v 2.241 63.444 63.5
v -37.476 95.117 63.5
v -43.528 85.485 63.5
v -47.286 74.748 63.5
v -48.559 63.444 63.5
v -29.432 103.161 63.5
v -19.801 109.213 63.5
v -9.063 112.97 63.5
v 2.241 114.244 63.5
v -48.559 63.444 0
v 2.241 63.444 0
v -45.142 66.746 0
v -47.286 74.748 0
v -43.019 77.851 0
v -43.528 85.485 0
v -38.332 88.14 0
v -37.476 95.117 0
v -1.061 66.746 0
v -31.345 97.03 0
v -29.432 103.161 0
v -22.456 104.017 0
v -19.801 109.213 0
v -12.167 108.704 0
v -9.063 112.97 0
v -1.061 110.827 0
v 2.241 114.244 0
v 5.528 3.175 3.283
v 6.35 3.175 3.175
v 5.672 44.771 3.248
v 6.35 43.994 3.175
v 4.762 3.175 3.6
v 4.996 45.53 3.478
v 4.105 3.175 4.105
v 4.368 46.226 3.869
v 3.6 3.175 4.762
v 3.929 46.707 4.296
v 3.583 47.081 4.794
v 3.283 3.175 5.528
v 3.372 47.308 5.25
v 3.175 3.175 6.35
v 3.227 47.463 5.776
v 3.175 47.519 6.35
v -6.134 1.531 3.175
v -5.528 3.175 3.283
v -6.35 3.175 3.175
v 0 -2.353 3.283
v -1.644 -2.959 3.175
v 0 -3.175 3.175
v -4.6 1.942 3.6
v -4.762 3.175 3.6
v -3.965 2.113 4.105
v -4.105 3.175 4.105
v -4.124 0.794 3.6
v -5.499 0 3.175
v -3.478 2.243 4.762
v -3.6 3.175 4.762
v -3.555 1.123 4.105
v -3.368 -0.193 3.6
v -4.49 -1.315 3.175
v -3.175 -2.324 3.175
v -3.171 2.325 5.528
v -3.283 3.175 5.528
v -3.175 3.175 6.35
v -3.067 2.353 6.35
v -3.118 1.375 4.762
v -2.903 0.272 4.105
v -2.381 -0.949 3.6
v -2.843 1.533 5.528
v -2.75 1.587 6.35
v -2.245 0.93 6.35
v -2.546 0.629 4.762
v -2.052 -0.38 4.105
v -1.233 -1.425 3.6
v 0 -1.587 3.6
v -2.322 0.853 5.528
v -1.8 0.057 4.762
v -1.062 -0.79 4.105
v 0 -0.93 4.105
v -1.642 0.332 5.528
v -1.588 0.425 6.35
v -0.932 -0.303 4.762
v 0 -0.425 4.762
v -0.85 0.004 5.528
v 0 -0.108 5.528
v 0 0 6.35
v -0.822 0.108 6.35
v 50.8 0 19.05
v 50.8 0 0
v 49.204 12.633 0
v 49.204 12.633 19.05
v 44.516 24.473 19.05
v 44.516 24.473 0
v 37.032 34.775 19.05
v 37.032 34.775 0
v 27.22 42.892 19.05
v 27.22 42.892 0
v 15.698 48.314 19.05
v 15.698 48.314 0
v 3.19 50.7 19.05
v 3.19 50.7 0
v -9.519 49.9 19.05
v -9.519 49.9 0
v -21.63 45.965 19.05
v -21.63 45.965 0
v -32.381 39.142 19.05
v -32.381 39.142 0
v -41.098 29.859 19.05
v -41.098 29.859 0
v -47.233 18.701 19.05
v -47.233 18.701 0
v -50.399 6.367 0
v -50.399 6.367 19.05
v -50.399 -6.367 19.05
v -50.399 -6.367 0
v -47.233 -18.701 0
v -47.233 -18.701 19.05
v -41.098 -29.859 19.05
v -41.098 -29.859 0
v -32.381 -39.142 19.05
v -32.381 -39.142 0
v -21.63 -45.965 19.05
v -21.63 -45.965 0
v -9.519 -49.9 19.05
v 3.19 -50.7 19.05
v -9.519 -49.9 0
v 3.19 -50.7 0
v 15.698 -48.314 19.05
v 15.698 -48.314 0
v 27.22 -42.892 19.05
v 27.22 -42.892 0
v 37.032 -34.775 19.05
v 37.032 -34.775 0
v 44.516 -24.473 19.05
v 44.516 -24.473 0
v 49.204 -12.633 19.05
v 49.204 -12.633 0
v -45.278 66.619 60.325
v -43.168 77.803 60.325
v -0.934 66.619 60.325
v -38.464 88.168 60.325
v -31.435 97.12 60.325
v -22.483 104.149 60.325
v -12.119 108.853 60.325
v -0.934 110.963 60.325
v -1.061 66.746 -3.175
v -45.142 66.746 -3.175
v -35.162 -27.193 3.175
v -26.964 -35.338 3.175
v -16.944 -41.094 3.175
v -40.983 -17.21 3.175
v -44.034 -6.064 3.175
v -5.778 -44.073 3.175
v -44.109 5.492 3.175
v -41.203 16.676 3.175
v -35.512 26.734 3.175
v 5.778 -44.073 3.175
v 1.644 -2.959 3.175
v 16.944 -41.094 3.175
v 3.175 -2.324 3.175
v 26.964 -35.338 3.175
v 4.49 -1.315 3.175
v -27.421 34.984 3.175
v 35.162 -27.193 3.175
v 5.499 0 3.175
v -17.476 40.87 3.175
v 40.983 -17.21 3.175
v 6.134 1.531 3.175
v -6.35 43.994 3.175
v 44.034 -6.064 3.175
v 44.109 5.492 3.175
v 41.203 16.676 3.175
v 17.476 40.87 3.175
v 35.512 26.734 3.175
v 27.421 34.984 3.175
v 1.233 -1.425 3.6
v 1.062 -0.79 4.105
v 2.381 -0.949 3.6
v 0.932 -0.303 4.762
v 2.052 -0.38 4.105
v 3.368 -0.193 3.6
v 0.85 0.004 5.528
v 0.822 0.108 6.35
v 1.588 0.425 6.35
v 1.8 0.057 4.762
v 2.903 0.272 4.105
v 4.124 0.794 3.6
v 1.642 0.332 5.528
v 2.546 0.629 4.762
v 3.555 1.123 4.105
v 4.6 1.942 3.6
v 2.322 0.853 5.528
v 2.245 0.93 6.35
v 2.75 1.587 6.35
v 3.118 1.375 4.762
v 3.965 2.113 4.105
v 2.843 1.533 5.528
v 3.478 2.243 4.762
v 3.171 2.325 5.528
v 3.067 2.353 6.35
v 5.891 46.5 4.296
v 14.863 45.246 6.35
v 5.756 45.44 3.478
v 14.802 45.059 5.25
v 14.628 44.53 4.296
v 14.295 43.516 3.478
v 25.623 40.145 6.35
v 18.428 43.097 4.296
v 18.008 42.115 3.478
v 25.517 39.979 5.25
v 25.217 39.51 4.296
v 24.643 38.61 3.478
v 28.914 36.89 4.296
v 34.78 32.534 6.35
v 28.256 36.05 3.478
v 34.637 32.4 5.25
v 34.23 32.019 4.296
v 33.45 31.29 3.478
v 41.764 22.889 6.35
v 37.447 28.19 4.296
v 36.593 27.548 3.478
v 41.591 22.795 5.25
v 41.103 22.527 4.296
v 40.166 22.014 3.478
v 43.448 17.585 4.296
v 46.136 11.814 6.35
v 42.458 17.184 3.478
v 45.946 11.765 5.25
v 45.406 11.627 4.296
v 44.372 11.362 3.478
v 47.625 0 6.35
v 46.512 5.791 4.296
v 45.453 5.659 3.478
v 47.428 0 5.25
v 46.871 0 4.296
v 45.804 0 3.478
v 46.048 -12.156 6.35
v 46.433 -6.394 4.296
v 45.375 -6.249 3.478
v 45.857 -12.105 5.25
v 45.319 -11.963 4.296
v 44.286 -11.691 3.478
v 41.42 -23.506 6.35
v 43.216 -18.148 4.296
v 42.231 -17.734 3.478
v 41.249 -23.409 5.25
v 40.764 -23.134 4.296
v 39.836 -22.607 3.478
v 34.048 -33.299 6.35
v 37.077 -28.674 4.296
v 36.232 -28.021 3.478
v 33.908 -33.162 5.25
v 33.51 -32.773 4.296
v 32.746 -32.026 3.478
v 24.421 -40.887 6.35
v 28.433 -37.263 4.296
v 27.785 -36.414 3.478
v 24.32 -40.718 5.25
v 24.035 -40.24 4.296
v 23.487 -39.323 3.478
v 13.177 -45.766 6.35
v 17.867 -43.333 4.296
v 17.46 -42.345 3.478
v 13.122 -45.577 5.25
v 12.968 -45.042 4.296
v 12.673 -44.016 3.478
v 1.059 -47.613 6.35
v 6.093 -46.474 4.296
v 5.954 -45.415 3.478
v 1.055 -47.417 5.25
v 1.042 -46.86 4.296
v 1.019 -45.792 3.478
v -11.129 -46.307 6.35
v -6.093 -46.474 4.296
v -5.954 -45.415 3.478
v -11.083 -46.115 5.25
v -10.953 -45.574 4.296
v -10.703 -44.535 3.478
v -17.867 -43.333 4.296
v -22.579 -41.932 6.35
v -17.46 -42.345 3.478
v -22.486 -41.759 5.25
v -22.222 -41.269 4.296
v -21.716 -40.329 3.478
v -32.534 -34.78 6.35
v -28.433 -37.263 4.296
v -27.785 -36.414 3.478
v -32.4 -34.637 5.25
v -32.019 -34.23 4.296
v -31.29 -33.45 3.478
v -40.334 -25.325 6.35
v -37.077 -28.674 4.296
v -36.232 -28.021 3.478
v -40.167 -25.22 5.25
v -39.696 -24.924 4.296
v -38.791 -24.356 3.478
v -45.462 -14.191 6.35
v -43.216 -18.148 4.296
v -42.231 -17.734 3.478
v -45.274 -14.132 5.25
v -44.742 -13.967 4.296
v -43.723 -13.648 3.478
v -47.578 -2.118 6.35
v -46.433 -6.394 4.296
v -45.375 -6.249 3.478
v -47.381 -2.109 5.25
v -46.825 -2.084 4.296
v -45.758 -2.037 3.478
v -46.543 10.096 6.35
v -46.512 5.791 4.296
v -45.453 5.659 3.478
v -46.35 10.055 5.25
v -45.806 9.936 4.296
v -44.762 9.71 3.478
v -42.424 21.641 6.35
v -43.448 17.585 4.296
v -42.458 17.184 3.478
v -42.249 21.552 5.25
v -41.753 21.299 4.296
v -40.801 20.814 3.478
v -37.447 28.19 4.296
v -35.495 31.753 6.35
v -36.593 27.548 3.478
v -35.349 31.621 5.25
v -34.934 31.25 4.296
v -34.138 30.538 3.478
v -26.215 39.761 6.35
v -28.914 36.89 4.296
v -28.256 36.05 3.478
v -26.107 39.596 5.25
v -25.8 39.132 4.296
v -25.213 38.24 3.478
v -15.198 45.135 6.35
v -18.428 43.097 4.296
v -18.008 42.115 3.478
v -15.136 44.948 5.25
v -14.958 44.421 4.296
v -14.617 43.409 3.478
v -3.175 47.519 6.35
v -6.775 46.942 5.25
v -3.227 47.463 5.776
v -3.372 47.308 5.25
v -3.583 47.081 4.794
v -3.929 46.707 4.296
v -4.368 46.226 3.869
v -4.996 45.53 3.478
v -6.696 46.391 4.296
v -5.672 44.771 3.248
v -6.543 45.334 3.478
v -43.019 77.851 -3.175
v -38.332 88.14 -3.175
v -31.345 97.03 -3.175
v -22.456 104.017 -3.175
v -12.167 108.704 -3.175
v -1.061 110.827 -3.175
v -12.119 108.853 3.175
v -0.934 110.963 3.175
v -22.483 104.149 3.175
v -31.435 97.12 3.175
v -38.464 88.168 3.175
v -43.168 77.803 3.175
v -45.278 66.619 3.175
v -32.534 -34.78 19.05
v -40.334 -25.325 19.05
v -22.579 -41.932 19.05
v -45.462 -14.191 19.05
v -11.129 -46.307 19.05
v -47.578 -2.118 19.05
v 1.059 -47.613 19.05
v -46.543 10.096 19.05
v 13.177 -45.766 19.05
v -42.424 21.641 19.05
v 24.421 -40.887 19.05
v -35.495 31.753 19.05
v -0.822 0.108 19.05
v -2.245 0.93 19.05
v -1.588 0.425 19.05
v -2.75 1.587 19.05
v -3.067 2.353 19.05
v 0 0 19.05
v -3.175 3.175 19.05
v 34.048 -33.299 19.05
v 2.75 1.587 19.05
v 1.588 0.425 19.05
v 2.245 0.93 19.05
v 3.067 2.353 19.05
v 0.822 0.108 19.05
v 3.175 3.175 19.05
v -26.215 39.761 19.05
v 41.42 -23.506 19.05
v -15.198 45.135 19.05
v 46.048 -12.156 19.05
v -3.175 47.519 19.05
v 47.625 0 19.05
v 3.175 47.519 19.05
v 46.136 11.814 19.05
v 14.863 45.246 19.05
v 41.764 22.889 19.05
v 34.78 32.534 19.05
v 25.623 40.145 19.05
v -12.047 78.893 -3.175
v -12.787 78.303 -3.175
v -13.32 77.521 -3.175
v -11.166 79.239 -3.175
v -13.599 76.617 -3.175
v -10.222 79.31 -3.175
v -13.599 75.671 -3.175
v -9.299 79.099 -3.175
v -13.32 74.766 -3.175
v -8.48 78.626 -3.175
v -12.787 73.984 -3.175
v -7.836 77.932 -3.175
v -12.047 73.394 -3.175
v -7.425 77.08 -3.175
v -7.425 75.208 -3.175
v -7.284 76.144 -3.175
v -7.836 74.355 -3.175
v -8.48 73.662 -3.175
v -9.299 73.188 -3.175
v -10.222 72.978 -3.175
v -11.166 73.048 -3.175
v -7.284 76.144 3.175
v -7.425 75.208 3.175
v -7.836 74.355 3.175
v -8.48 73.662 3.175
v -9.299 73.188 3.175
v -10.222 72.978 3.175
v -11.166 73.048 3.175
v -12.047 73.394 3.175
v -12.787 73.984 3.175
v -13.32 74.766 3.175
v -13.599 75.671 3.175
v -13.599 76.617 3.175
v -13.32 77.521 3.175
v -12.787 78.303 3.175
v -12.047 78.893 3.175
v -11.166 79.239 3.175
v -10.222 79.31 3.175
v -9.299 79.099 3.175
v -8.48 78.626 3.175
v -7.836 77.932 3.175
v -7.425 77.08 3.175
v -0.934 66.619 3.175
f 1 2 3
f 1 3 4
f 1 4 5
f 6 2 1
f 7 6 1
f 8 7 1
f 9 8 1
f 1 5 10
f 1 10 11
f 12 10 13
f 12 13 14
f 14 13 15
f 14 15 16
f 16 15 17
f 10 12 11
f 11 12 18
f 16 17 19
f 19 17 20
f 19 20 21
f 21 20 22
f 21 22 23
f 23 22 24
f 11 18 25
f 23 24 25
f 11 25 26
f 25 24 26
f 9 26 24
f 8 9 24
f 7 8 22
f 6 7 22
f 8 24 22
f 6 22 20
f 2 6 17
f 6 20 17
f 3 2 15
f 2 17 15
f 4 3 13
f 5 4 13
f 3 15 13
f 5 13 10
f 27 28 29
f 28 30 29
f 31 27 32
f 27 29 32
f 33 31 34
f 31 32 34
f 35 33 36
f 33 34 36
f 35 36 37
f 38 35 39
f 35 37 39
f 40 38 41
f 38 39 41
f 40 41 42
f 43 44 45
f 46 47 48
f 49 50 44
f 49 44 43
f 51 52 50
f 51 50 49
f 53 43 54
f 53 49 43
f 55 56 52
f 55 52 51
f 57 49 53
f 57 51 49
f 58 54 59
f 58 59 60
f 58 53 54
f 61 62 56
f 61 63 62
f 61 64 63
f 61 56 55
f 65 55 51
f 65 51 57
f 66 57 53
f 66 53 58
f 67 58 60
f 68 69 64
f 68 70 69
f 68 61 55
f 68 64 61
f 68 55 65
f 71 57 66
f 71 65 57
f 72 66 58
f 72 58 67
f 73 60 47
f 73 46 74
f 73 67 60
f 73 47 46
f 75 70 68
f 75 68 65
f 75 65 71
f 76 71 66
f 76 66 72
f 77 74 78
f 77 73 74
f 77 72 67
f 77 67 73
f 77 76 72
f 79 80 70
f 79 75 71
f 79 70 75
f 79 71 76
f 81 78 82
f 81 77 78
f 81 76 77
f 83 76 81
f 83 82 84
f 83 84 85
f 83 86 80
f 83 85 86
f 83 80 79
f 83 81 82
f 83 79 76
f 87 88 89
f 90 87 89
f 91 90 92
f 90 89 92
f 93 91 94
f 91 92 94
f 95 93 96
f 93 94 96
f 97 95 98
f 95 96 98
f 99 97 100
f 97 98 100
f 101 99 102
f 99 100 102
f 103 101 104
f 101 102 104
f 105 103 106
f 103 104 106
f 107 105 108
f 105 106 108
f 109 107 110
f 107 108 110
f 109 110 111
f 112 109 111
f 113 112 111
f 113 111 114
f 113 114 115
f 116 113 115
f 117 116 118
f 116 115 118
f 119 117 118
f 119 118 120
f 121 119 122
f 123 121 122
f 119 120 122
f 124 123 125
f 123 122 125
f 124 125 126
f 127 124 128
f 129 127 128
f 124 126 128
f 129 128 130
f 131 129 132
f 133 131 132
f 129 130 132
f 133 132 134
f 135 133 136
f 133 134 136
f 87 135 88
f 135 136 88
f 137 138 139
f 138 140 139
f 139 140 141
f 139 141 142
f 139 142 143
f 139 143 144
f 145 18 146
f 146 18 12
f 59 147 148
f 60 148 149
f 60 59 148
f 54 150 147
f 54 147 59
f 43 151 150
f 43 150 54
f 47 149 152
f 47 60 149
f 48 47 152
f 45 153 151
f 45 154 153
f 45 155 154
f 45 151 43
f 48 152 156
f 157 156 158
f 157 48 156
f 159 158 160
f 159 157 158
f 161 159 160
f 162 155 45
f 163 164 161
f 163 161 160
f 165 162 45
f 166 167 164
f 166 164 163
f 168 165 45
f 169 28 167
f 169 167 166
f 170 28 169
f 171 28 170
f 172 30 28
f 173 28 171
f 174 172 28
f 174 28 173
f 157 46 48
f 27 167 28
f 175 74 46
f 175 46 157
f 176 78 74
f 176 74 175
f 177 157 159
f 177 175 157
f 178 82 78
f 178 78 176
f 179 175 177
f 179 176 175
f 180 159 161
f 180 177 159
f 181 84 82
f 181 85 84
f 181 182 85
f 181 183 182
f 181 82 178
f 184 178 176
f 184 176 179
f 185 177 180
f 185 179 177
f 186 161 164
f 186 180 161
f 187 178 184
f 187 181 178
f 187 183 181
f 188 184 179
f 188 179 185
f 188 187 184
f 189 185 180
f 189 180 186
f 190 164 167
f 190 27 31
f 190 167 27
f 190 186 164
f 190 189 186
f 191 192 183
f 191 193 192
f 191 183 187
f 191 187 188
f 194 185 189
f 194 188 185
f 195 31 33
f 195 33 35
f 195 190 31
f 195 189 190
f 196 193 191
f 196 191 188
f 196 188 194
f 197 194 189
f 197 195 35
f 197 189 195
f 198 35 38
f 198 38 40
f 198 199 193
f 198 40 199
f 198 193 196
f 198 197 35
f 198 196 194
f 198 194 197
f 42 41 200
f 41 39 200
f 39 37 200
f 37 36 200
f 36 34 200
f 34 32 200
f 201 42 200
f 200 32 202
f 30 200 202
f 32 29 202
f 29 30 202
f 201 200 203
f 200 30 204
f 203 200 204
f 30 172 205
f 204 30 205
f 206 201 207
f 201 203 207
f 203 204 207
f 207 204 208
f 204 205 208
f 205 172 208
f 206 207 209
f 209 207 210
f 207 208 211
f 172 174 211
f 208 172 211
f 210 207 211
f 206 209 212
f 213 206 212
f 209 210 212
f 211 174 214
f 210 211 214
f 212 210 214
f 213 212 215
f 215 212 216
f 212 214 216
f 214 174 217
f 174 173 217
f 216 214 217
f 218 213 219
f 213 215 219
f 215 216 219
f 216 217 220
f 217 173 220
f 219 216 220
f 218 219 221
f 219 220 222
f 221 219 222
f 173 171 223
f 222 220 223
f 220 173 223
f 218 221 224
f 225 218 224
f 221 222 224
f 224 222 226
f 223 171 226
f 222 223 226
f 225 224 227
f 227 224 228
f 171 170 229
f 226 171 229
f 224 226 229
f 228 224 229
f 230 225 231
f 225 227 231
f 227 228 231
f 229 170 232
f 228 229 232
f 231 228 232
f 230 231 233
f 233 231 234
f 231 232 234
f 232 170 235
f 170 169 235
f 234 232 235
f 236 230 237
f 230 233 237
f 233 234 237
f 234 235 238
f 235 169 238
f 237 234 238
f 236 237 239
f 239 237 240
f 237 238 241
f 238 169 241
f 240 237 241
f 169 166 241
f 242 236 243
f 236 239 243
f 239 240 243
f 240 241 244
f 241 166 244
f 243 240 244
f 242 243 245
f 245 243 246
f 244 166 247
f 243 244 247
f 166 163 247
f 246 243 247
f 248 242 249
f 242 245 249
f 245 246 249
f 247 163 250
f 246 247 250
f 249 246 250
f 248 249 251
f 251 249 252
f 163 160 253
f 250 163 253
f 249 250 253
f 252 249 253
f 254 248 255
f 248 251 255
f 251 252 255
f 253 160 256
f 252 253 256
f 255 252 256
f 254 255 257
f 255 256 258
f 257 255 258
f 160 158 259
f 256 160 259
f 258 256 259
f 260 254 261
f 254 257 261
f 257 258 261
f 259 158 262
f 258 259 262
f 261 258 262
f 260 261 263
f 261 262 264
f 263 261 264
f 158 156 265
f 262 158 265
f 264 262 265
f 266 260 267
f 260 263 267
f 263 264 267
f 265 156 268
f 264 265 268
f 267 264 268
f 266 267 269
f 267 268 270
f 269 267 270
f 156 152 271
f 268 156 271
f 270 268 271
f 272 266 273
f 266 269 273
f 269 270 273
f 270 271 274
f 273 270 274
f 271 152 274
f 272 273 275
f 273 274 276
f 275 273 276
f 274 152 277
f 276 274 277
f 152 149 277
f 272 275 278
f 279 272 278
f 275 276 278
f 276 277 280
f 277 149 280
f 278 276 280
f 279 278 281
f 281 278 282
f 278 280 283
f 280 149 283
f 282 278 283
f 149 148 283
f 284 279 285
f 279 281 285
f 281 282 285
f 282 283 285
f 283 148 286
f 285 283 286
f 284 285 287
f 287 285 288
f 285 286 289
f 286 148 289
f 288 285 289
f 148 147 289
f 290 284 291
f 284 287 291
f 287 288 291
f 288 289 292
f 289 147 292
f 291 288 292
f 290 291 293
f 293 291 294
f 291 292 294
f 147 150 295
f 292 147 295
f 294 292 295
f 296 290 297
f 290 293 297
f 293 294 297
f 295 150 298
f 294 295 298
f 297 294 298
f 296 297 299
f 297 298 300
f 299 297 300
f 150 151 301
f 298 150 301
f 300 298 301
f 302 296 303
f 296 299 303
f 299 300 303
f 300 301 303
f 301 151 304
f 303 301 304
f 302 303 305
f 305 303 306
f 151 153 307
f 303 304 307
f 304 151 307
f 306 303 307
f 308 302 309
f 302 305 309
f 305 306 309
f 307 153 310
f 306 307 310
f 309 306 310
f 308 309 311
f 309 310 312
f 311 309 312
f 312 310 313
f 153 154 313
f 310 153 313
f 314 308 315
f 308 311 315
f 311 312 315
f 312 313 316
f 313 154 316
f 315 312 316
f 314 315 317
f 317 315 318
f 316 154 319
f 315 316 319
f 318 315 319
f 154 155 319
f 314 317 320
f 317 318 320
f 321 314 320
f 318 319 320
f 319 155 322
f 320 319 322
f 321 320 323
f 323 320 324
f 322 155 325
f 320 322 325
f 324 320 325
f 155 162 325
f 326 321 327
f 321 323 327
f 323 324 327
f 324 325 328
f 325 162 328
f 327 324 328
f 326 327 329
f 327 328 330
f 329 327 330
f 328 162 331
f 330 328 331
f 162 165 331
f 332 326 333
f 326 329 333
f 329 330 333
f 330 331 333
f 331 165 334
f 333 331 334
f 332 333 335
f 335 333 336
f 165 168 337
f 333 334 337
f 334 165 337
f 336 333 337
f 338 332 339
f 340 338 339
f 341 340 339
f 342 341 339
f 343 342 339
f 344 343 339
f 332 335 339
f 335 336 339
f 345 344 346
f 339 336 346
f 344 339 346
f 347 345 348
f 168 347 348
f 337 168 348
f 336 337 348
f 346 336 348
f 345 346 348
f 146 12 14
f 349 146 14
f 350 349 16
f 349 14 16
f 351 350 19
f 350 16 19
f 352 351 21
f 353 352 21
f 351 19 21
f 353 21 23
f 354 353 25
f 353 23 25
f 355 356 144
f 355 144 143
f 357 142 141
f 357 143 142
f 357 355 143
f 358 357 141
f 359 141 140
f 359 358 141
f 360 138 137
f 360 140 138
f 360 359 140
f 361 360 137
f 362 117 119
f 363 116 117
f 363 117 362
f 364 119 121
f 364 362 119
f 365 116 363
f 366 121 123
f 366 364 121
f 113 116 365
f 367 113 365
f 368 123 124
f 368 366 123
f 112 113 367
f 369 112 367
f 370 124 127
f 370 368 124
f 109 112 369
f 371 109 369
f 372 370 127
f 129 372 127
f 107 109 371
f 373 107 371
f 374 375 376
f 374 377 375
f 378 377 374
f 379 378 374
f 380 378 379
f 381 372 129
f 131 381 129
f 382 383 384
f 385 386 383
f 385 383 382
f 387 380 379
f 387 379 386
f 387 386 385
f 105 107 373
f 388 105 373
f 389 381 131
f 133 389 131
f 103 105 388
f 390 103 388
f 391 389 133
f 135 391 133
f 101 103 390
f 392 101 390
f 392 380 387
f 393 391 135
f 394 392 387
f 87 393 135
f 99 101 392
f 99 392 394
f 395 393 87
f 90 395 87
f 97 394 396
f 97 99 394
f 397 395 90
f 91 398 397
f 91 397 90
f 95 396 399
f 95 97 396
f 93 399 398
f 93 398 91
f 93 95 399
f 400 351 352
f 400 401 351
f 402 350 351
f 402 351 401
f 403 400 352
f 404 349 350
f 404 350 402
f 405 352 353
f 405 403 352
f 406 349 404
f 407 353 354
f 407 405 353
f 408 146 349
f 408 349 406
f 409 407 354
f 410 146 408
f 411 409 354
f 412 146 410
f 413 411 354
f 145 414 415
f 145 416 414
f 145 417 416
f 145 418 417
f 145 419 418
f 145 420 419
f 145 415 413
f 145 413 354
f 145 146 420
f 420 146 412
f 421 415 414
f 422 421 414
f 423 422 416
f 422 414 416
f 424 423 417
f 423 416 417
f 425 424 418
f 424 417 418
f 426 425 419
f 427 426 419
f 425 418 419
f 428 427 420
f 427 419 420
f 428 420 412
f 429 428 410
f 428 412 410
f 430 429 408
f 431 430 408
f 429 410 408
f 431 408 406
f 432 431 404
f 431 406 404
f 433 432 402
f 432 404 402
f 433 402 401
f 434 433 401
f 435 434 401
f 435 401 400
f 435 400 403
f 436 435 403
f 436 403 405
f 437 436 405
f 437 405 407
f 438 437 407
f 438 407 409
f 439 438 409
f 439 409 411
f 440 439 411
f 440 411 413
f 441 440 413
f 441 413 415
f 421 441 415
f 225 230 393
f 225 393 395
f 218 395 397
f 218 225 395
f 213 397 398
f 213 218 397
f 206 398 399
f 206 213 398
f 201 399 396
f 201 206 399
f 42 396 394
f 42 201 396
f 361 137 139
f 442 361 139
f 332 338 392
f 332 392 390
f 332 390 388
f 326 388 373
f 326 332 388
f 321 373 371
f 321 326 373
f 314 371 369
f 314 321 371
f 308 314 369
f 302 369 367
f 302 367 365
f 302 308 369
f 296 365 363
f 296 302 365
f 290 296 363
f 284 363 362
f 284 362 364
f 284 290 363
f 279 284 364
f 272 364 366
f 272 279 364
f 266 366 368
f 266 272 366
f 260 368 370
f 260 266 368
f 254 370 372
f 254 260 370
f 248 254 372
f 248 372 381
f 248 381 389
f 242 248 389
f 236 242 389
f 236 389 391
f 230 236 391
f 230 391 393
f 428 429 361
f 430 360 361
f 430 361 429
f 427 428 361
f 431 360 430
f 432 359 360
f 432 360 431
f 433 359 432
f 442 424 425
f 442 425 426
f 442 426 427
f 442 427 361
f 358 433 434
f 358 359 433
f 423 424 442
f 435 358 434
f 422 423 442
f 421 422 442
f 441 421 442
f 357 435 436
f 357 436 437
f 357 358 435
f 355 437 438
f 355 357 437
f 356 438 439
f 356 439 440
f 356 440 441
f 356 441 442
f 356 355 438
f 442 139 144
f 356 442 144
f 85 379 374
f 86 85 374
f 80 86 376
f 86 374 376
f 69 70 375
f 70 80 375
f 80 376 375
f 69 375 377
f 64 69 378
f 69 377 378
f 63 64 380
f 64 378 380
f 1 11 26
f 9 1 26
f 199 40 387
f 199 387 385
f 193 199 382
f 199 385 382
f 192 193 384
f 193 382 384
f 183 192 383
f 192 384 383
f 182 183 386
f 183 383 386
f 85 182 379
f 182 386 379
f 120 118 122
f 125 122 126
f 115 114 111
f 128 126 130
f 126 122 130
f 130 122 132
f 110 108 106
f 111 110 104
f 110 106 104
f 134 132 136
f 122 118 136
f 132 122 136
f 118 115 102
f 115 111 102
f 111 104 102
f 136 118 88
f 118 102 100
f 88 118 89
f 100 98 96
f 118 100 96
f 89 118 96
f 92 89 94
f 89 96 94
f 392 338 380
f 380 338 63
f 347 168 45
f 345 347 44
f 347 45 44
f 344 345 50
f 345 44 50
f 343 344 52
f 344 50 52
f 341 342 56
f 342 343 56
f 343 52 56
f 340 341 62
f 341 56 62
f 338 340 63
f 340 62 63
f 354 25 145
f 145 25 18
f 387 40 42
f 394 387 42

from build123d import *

# Parameters (mm, degrees)
F0_R      = 50.8
F1_DEPTH  = 19.05
F2_T      = -3.175
F4_DEPTH  = 15.875
F5_R      = 3.17499
F7_DEPTH  = 63.5
F8_T      = -3.175
F10_DEPTH = 3.175
F11_R     = 3.175
F12_DEPTH = 25.4


# Not quite as in the source:
# - a fillet or chamfer is up to 0.001 mm smaller than in the source, because OpenCascade refuses the exact size


with BuildPart() as f1:
    # F0 (on Top) → F1 (new body)
    with BuildSketch(Plane.XY):
        Circle(F0_R)
    extrude(amount=F1_DEPTH)

    # F2
    f2_openings = [f1.faces().sort_by_distance(p)[0] for p in [
        (0, 0, 19.05),
    ]]
    offset(amount=F2_T, openings=f2_openings)

    # F3 (on face) → F4 (join, through all)
    with BuildSketch(Plane.XY.offset(3.175)):
        with BuildLine():
            Line((-3.175, 0), (0, 0))
            Line((0, 0), (3.175, 0))
            Line((3.175, 0), (3.175, 47.519048812))
            ThreePointArc((3.175, 47.519048812), (0, 47.625), (-3.175, 47.519048812))
            Line((-3.175, 47.519048812), (-3.175, 0))
        make_face()
    extrude(amount=F4_DEPTH)

    # F5 (radius 3.175 in the source; OpenCascade refuses exactly that, so slightly less here)
    f5_edges = [f1.edges().sort_by_distance(p)[0] for p in [
        (34.780382, 32.534069, 3.175),
        (-32.534069, -34.780382, 3.175),
        (-3.175, 23.759524, 3.175),
        (0, 0, 3.175),
        (3.175, 23.759524, 3.175),
        (3.175, 0, 11.1125),
        (-3.175, 0, 11.1125),
    ]]
    fillet(f5_edges, radius=F5_R)


with BuildPart() as f7:
    # F6 (on Top) → F7 (new body)
    with BuildSketch(Plane.XY):
        with BuildLine():
            Line((-48.5592149198, 63.44383955), (2.2407850802, 63.44383955))
            Line((2.2407850802, 63.44383955), (2.2407850802, 114.24383955))
            ThreePointArc((2.2407850802, 114.24383955), (-33.6802394041, 99.3648640343), (-48.5592149198, 63.44383955))
        make_face()
    extrude(amount=F7_DEPTH)

    # F8 (hollow: no face is removed)
    offset(amount=F8_T, mode=Mode.SUBTRACT)

    # F9 (on face) → F10 (join)
    with BuildSketch(Plane(origin=(0, 0, 0), x_dir=(1, 0, 0), z_dir=(0, 0, -1))):
        with BuildLine():
            Line((-1.0612149198, -110.8269251397), (-1.0612149198, -66.74583955))
            Line((-1.0612149198, -66.74583955), (-45.1423005095, -66.74583955))
            ThreePointArc((-45.1423005095, -66.74583955), (-31.3453728126, -97.0299974428), (-1.0612149198, -110.8269251397))
        make_face()
    extrude(amount=F10_DEPTH)

    # F11 (on face) → F12 (cut)
    with BuildSketch(Plane(origin=(0, 0, -3.175), x_dir=(1, 0, 0), z_dir=(0, 0, -1))):
        with Locations((-10.4592149198, -76.14383955)):
            Circle(F11_R)
    extrude(amount=-F12_DEPTH, mode=Mode.SUBTRACT)


solid = Compound([f1.part, f7.part])
